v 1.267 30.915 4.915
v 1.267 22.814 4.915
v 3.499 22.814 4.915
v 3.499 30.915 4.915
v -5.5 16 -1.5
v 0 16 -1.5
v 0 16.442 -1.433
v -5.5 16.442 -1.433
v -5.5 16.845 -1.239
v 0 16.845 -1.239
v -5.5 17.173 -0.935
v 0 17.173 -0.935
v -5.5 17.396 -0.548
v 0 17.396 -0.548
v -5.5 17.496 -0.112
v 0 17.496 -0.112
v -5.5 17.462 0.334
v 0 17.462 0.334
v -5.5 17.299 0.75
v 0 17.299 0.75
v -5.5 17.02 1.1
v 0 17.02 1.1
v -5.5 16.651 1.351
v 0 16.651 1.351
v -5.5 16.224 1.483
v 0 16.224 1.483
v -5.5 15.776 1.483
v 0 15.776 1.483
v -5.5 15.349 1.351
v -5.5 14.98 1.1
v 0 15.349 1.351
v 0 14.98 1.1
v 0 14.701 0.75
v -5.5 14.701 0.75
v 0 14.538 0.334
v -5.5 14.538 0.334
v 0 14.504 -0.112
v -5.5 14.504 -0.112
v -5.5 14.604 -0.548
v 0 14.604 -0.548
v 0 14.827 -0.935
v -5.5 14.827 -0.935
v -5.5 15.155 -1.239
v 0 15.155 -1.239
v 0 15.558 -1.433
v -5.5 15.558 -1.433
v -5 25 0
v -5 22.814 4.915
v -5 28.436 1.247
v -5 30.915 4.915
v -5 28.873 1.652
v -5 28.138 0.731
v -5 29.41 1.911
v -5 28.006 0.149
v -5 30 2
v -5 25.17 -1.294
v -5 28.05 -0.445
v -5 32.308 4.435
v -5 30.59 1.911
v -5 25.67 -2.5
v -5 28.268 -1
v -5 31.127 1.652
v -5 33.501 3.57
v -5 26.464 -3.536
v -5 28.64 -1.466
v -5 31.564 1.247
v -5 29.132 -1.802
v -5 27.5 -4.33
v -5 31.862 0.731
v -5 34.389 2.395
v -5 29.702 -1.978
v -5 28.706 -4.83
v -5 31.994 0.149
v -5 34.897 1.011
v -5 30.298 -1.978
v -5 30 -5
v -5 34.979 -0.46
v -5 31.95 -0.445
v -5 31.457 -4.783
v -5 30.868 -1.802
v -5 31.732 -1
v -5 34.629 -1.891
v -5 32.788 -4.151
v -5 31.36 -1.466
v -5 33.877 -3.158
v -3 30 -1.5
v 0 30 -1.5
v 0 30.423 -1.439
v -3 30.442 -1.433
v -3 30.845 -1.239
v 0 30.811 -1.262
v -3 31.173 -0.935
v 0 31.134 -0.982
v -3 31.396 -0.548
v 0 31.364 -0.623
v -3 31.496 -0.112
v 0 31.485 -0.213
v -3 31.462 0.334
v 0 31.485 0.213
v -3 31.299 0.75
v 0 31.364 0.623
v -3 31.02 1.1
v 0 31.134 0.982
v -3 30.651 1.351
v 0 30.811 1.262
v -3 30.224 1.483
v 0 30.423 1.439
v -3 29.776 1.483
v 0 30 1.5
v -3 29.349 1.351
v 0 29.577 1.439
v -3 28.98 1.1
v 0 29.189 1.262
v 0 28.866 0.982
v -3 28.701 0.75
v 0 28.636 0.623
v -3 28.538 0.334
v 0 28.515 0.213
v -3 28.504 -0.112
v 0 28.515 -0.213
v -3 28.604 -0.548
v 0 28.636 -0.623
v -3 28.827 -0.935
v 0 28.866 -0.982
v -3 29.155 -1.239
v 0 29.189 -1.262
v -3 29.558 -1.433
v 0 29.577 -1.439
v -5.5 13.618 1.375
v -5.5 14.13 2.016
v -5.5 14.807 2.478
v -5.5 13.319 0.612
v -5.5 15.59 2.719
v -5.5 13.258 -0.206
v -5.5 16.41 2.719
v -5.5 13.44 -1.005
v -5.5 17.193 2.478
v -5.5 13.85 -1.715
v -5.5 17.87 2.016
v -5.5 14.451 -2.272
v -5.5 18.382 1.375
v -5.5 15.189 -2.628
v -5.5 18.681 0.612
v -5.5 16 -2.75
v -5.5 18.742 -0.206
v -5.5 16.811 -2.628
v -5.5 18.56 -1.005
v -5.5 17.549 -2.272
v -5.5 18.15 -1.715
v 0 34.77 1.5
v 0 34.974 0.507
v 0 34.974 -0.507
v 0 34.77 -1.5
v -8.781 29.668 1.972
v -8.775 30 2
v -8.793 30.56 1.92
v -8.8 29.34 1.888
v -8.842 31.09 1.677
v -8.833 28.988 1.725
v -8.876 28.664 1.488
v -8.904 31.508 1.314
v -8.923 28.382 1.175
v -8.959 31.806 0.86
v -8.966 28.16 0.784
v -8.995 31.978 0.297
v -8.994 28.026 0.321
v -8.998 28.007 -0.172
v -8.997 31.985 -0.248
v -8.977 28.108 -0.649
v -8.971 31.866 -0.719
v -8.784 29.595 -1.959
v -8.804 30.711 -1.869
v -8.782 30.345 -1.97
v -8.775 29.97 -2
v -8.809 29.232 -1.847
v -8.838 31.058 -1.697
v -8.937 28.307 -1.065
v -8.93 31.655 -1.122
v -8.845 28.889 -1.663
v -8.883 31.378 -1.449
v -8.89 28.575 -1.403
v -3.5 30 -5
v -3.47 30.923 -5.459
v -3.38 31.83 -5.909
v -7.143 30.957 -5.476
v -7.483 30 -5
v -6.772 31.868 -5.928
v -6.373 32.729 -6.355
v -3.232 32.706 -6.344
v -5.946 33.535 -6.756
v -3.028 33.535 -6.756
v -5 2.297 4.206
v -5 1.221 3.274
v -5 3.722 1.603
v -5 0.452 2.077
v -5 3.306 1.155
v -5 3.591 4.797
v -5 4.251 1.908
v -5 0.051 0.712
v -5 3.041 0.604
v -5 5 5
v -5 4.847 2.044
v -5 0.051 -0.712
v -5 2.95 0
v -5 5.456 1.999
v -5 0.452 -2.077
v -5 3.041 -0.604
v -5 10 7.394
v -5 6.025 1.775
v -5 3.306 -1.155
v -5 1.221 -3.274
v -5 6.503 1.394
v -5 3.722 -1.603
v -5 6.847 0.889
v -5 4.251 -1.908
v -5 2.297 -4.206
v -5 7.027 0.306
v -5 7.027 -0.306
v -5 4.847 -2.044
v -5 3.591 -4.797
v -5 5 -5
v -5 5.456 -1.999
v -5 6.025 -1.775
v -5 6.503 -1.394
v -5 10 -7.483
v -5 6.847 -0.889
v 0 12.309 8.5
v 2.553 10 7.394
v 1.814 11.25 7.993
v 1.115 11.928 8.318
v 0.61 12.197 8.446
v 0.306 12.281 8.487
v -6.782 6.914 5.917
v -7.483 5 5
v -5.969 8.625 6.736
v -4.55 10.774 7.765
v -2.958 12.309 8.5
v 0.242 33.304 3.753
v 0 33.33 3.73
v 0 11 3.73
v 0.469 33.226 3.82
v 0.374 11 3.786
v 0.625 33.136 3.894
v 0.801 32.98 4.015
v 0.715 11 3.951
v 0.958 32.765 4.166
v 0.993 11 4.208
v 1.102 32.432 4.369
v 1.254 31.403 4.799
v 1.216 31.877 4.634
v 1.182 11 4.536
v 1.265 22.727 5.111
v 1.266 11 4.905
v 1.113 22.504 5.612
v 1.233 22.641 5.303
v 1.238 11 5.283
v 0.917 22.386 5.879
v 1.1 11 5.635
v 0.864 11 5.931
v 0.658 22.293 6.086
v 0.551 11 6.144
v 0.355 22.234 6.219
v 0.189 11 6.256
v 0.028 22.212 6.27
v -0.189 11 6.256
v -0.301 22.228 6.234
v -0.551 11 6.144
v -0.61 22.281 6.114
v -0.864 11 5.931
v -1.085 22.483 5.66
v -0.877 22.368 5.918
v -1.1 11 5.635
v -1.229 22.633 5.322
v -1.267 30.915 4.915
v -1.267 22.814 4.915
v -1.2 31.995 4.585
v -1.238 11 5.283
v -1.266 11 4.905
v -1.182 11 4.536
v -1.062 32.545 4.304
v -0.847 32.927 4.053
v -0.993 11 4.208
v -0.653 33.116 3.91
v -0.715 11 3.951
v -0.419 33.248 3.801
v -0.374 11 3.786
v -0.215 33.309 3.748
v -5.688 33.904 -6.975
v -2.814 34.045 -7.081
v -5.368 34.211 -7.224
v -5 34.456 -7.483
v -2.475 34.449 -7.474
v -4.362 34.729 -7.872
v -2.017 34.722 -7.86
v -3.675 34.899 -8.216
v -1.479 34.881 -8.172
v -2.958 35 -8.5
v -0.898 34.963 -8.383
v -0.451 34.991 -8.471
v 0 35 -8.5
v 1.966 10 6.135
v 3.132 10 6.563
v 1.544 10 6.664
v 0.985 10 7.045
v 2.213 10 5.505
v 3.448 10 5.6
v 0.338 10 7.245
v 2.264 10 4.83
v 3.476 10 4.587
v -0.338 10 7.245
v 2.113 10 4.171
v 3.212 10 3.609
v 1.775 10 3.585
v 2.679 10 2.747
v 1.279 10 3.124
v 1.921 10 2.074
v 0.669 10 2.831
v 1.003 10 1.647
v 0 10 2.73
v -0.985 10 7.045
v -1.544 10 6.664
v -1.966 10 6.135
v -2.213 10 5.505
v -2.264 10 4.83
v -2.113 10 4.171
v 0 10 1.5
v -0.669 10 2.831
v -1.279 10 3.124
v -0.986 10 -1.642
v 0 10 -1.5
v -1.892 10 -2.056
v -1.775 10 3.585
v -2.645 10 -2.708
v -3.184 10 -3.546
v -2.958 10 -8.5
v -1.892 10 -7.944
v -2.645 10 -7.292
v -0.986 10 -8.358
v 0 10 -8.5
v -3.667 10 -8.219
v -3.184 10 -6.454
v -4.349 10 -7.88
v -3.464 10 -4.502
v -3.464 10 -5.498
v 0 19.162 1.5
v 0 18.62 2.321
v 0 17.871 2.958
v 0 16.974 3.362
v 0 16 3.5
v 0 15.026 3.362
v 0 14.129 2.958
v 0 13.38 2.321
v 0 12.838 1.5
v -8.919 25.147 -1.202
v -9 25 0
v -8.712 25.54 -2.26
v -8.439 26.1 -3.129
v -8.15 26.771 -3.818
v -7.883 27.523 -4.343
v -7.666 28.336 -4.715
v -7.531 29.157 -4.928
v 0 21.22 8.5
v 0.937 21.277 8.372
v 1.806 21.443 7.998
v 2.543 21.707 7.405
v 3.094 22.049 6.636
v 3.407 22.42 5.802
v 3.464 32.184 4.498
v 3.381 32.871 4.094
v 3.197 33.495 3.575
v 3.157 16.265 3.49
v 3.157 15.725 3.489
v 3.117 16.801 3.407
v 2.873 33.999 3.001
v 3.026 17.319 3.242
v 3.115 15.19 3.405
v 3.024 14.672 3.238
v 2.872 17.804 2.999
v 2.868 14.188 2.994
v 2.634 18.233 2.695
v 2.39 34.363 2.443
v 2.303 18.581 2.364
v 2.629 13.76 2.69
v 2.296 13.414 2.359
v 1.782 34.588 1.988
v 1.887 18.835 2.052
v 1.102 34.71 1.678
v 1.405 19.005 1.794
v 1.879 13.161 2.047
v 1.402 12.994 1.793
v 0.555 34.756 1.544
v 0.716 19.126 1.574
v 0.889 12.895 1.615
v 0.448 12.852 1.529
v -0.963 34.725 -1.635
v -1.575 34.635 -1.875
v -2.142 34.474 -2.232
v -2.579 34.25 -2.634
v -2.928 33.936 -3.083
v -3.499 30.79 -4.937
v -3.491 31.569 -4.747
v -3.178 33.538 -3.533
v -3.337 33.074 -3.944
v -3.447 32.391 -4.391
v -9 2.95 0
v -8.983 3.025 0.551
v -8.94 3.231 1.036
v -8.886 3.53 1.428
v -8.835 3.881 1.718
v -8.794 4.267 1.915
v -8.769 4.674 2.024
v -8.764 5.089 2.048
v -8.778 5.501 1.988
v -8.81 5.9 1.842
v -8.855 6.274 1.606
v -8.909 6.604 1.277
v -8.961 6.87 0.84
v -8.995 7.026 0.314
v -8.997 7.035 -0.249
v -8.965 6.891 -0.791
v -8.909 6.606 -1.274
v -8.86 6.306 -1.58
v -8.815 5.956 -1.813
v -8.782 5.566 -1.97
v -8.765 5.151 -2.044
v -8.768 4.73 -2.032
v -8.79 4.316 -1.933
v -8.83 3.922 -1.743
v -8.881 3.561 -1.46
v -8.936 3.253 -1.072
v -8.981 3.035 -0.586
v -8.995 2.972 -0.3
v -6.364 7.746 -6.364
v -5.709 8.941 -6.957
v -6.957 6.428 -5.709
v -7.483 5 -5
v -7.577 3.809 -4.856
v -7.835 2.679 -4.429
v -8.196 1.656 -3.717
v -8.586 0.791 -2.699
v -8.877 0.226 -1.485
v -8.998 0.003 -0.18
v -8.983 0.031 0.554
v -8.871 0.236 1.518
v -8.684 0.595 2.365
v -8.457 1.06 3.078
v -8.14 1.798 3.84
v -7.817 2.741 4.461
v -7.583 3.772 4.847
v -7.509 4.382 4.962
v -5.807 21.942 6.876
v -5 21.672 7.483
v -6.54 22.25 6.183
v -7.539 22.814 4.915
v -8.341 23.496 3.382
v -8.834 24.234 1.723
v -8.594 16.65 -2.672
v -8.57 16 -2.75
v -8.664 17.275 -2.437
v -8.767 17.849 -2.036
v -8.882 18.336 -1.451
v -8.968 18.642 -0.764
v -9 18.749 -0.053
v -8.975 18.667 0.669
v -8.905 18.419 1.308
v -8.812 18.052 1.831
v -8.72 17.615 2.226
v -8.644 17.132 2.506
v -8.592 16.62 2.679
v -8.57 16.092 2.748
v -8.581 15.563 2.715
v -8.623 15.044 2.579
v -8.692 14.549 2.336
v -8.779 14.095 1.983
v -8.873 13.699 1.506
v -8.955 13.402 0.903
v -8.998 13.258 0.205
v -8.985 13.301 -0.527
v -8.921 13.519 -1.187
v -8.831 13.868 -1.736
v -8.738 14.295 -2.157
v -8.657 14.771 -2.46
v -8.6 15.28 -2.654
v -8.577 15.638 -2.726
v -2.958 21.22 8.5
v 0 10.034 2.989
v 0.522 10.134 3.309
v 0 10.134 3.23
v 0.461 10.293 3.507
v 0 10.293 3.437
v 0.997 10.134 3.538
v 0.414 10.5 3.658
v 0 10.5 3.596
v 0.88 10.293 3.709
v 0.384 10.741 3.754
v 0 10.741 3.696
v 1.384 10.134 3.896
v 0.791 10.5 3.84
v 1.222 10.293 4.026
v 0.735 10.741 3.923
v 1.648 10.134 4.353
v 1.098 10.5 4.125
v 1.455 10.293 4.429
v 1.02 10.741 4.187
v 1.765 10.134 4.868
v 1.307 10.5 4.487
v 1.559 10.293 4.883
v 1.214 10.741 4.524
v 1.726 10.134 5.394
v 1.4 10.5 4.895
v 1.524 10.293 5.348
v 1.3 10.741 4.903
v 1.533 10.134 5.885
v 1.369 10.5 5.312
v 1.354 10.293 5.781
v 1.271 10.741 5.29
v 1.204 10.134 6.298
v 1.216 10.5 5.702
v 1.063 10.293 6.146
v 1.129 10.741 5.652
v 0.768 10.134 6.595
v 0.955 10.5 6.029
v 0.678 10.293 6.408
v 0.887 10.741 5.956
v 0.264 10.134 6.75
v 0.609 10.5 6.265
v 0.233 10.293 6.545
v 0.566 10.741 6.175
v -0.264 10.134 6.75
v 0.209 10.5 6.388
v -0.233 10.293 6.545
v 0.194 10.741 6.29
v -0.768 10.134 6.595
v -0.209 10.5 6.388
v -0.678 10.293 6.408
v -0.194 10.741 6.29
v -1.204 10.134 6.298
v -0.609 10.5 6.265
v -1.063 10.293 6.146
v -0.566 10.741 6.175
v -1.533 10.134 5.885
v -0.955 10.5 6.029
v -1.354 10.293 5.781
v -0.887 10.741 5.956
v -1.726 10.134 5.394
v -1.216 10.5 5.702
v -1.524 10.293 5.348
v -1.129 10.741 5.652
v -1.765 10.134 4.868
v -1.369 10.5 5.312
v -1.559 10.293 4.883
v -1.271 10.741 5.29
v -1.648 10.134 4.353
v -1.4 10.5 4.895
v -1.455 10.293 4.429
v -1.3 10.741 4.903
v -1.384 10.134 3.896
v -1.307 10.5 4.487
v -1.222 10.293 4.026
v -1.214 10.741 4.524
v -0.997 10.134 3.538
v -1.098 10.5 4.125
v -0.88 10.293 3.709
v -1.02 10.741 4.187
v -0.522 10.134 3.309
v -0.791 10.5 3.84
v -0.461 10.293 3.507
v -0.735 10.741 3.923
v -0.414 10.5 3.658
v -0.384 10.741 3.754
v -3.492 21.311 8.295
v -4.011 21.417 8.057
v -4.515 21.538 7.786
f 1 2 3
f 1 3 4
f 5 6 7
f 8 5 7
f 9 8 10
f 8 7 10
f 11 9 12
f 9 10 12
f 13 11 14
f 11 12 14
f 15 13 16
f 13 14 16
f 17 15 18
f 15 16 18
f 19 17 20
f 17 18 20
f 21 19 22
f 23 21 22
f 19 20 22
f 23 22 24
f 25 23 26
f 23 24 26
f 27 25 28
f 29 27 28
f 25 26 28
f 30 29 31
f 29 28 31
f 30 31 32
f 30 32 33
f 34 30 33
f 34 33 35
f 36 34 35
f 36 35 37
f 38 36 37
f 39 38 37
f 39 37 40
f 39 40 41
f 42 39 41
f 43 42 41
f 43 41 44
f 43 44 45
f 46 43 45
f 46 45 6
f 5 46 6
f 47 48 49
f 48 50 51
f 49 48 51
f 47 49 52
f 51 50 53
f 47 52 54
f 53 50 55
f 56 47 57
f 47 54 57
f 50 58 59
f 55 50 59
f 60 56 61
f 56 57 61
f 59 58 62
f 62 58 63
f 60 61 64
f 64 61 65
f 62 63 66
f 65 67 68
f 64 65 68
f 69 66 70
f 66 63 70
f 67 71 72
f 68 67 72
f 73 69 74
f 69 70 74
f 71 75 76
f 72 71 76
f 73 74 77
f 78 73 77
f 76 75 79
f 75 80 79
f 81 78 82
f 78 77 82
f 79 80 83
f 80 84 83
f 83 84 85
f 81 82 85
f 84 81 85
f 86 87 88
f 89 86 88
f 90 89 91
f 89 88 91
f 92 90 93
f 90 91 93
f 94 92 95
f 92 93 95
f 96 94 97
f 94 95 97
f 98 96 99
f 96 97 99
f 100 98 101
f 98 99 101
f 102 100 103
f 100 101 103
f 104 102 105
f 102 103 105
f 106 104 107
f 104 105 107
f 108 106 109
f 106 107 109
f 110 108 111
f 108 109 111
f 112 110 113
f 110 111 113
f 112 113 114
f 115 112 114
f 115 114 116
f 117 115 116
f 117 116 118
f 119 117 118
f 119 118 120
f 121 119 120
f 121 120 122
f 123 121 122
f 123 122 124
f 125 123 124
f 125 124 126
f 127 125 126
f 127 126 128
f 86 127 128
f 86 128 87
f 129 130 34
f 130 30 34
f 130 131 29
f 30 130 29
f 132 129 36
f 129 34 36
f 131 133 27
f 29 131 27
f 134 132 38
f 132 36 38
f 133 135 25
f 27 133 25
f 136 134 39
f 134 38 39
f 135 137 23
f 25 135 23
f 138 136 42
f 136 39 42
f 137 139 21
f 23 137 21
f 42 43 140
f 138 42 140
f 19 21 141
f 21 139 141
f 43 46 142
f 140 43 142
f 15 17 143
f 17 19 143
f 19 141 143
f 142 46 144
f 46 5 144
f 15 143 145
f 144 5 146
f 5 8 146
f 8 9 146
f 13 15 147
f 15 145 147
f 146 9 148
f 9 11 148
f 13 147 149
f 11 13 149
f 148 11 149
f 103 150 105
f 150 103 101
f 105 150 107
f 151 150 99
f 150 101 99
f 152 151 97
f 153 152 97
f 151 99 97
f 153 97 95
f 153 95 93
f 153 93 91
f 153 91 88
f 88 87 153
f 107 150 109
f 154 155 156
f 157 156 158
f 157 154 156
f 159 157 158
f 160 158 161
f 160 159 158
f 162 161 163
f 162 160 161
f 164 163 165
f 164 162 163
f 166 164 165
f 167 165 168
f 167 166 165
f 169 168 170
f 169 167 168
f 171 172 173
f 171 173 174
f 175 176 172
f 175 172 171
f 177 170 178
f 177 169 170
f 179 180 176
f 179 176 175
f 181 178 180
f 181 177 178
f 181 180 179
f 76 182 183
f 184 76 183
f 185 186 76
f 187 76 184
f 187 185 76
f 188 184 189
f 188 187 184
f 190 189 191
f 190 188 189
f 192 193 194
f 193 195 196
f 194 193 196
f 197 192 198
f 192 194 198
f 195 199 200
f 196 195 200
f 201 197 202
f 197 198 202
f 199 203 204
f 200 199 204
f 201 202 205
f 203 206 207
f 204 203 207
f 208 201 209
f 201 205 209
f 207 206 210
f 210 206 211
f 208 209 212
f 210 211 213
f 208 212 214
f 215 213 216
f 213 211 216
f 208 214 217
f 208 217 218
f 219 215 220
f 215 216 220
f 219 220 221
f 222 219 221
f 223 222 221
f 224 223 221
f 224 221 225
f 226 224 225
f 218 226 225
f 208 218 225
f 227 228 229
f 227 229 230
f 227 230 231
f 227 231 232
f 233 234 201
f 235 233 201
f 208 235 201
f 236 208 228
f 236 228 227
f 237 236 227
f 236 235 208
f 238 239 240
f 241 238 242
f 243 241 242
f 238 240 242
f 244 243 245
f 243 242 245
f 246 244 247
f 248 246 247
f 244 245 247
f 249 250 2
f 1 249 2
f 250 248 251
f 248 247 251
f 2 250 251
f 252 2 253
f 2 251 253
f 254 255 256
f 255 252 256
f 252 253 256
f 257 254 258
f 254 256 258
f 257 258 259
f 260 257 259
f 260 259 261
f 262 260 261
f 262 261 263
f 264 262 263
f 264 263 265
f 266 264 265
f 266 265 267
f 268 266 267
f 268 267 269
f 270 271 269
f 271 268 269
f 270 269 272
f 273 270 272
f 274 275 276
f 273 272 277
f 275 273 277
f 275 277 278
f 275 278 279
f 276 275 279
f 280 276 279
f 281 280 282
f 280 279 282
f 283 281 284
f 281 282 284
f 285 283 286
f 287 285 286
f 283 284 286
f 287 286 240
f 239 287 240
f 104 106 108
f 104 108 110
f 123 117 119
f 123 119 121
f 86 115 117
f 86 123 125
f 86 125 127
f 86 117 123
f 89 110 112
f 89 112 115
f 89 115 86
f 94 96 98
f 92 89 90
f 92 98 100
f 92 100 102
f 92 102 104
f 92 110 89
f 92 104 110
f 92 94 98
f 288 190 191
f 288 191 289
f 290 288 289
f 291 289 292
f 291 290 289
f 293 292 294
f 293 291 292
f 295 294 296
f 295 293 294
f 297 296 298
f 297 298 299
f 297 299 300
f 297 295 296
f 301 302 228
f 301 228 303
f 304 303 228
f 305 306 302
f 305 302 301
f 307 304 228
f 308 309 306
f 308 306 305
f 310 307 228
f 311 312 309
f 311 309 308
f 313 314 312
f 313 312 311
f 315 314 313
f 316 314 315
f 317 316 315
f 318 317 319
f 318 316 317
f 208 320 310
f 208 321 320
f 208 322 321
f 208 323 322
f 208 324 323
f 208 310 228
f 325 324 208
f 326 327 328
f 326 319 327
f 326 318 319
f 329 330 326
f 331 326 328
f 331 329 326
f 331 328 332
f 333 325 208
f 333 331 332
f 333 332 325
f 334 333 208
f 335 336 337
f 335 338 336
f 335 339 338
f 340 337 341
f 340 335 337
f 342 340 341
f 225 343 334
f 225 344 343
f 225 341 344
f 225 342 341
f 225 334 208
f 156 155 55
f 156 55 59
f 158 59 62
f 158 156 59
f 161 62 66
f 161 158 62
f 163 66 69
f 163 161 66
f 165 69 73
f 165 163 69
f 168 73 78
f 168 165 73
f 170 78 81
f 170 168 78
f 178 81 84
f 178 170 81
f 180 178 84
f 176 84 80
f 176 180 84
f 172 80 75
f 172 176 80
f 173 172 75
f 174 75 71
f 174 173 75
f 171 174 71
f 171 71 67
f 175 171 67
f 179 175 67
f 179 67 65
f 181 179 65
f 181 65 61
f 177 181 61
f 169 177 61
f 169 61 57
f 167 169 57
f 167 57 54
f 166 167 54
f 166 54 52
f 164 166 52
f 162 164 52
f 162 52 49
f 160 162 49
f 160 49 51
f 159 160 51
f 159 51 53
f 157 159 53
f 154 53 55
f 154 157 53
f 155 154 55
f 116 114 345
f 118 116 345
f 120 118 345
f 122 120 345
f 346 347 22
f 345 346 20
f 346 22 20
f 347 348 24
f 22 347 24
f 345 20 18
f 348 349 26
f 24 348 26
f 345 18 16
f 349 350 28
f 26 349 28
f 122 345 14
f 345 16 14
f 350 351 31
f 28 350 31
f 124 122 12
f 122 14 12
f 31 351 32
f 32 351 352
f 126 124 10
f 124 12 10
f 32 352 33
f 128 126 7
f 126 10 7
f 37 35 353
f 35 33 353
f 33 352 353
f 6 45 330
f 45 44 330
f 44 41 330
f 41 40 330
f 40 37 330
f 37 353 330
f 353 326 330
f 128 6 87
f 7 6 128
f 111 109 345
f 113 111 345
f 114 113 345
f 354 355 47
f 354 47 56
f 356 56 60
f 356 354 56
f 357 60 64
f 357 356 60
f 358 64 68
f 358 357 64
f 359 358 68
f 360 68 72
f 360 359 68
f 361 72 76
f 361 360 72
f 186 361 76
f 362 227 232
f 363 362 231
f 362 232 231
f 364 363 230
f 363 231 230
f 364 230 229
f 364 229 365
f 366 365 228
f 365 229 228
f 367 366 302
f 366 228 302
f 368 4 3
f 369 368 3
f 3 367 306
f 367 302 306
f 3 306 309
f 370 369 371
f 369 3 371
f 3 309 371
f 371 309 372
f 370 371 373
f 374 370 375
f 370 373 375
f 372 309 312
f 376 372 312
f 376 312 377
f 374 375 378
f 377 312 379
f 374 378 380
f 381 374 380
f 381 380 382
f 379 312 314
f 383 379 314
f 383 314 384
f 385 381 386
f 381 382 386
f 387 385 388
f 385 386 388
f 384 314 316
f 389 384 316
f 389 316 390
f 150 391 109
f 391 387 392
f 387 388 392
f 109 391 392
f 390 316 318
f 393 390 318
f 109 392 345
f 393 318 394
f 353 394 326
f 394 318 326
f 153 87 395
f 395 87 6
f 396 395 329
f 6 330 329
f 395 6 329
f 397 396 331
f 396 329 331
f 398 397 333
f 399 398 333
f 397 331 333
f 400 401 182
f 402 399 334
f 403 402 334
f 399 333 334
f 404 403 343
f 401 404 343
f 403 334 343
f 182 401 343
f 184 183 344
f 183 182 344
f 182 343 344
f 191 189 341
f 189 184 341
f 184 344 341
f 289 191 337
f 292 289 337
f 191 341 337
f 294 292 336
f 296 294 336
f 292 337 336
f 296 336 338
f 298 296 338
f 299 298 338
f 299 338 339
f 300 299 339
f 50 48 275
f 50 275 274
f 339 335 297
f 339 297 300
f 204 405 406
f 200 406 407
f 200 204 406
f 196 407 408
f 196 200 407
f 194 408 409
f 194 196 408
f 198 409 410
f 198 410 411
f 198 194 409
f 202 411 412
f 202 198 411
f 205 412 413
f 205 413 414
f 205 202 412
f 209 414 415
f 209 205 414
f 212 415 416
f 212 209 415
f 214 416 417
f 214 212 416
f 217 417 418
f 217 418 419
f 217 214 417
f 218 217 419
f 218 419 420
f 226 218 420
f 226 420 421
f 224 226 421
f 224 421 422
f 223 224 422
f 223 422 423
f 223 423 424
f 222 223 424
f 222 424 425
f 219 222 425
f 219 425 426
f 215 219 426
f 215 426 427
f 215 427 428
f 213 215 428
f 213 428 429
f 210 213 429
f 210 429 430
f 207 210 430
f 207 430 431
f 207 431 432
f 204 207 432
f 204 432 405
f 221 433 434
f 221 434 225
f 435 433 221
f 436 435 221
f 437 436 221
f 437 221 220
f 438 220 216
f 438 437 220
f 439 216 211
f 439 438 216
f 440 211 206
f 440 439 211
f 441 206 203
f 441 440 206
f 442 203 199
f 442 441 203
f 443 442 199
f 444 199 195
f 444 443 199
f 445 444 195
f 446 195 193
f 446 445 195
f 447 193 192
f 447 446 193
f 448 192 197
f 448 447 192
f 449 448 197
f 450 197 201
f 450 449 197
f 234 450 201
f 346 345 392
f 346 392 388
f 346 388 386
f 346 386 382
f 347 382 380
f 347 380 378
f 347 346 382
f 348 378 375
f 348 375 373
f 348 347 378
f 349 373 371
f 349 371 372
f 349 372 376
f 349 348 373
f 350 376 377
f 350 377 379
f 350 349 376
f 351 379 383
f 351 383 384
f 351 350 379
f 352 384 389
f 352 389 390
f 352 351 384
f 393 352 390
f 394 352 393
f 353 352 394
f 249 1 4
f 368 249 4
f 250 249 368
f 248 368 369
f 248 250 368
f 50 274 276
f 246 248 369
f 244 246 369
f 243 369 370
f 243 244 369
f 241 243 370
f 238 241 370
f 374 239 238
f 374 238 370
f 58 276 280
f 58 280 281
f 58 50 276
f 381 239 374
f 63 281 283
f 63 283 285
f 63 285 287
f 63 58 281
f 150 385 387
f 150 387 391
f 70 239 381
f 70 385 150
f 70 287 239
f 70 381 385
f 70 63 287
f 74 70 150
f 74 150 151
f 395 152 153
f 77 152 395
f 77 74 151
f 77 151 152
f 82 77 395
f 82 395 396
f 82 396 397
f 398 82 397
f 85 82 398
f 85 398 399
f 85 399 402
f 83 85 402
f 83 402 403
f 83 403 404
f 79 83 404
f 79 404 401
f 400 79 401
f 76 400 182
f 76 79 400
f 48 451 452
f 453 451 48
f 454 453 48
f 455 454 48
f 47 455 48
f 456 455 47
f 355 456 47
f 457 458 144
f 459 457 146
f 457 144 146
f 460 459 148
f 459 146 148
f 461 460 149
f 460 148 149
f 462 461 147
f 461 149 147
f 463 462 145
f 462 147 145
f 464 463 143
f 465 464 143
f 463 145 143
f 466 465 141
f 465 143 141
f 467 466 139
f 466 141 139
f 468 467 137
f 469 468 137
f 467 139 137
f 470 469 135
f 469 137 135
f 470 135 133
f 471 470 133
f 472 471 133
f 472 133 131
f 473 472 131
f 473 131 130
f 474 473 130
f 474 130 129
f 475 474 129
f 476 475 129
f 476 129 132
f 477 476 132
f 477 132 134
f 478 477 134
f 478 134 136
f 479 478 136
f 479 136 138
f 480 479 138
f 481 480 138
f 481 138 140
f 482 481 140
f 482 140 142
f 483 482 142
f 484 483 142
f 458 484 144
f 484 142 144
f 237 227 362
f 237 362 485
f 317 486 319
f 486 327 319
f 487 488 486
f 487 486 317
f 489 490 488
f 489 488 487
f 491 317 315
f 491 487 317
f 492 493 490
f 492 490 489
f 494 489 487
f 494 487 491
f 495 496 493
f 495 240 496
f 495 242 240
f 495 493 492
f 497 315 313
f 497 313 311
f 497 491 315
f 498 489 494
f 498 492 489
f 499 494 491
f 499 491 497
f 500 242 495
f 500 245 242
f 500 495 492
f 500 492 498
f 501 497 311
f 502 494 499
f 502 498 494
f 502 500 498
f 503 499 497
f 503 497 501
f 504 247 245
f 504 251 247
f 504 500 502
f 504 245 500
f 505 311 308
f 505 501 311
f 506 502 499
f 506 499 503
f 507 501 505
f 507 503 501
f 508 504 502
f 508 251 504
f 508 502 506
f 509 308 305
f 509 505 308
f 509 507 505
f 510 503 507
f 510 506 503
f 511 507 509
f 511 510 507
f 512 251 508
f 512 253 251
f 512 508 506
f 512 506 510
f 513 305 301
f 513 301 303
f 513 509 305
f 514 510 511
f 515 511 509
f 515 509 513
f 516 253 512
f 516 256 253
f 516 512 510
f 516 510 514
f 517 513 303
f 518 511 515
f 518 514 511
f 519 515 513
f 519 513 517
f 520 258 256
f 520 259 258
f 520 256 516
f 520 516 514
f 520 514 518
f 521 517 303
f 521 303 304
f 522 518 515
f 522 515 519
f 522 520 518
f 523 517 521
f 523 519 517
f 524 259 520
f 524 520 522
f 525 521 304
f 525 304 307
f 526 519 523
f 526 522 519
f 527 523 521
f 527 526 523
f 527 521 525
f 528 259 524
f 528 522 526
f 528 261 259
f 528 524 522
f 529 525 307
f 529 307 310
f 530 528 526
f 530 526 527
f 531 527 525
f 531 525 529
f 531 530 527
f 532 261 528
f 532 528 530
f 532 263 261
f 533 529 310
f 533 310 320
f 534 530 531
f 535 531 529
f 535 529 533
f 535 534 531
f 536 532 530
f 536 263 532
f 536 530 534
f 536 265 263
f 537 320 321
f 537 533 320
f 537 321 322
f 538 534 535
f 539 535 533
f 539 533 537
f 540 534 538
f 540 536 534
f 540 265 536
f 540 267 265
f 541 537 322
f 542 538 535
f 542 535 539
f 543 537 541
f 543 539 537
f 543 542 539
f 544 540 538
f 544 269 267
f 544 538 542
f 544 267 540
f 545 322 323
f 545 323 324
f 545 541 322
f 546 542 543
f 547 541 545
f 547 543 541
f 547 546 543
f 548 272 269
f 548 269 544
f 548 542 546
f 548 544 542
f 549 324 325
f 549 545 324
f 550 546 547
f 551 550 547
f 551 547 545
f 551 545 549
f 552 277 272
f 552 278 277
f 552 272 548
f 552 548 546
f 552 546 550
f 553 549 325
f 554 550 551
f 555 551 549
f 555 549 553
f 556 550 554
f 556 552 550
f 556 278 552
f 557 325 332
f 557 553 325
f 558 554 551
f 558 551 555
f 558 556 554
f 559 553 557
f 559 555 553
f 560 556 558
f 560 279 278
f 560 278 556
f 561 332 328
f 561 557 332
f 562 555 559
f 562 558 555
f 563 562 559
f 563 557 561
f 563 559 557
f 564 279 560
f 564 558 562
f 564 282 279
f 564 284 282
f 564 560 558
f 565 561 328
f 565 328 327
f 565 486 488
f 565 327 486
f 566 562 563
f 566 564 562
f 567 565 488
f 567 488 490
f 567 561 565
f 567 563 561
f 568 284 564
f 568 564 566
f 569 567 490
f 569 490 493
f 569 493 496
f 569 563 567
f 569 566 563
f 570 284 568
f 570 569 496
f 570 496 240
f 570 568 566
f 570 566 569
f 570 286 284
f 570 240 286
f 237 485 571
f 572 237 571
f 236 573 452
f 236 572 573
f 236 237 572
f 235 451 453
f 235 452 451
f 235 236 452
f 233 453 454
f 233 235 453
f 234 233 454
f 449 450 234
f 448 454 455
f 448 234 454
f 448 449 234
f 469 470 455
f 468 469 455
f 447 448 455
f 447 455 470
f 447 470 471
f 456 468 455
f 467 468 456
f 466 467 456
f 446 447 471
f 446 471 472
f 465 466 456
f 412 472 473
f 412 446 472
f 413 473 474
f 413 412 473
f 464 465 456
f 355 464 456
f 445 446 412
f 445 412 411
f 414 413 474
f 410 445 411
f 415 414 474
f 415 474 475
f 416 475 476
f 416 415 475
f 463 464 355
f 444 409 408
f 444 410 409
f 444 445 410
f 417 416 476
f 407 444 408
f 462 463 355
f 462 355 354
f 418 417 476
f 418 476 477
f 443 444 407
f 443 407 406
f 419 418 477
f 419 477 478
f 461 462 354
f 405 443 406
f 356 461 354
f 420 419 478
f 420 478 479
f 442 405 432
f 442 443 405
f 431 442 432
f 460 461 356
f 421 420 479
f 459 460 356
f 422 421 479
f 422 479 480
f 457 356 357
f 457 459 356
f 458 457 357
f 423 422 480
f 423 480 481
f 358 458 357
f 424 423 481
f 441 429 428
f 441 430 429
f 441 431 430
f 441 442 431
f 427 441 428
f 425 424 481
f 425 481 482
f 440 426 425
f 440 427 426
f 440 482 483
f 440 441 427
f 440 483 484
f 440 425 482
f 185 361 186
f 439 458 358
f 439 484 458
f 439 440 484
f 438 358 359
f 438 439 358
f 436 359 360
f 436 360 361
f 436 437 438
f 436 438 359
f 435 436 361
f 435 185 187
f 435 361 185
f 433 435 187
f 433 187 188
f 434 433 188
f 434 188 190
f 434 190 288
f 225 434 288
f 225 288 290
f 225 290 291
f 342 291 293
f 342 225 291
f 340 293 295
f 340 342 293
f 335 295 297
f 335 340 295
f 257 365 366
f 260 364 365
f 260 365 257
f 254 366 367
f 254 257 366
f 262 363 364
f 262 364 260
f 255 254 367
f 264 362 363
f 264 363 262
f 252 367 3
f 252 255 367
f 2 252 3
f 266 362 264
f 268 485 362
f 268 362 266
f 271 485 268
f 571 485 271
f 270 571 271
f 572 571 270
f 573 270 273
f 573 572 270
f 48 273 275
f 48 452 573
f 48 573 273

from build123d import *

# Parameters (mm, degrees)
BOSS_EXTRUDE1_DEPTH = 35
SKETCH2_R           = 1.27
CUT_EXTRUDE1_DEPTH  = 35
CUT_EXTRUDE2_REACH  = 41.937
SKETCH3_W           = 10
SKETCH3_H           = 10
SKETCH4_R           = 2.049999964
CUT_EXTRUDE3_DEPTH  = 17.5
CUT_EXTRUDE5_START  = -7.95804
SKETCH6_R           = 2
CUT_EXTRUDE5_DEPTH  = 9.6
FILLET3_R           = 1
CUT_EXTRUDE6_START  = 8.64596
SKETCH6_3_R         = 2
CUT_EXTRUDE6_DEPTH  = 6.604
CUT_EXTRUDE7_START  = -14.986
CUT_EXTRUDE7_DEPTH  = 14.986
CUT_EXTRUDE8_DEPTH  = 31.496
SKETCH9_R           = 1.5
CUT_EXTRUDE9_DEPTH  = 14.224
CUT_EXTRUDE11_DEPTH = 6.048
SKETCH13_R          = 1.5
CUT_EXTRUDE12_DEPTH = 3
CUT_EXTRUDE13_START = -5.5
SKETCH15_R          = 2.75
CUT_EXTRUDE13_DEPTH = 7.572


with BuildPart() as part:
    # Sketch1 → Boss-Extrude1 (new body)
    with BuildSketch(Plane(origin=(0, 0, 0), x_dir=(1, 0, 0), z_dir=(0, 1, 0))):
        with BuildLine():
            Line((-2.958039892, 8.5), (2.958039892, 8.5))
            ThreePointArc((2.958039892, 8.5), (9, 0), (2.958039892, -8.5))
            Line((2.958039892, -8.5), (-2.958039892, -8.5))
            ThreePointArc((-2.958039892, -8.5), (-9, 0), (-2.958039892, 8.5))
        make_face()
    extrude(amount=BOSS_EXTRUDE1_DEPTH)

    # Sketch2 → Cut-Extrude1 (cut)
    with BuildSketch(Plane.XZ):
        with Locations(Location((0, -5, 0), (0, 0, 270))):
            Circle(SKETCH2_R)
        with Locations(Location((0, 5, 0), (0, 0, 270))):
            Circle(SKETCH2_R)
    extrude(amount=-CUT_EXTRUDE1_DEPTH, mode=Mode.SUBTRACT)

    # Cut-Extrude2: up to this face of the body (flat: up to its plane)
    cut_extrude2_end = Plane(part.part.faces().sort_by_distance((0, 17.5, 8.5))[0])
    # Sketch3 → Cut-Extrude2 (cut, up to the picked face)
    with BuildSketch(Plane(origin=(0, 0, -8.5), x_dir=(-1, 0, 0), z_dir=(0, 0, -1)), mode=Mode.PRIVATE) as cut_extrude2_sk1:
        with Locations((0, 5)):
            Rectangle(SKETCH3_W, SKETCH3_H)
    cut_extrude2_tool1 = split(extrude(cut_extrude2_sk1.sketch, amount=-CUT_EXTRUDE2_REACH, mode=Mode.PRIVATE), bisect_by=cut_extrude2_end, keep=Keep.BOTH, mode=Mode.PRIVATE)
    add(cut_extrude2_tool1.solids().sort_by(Axis((0, 5, -8.5), (0, 0, 1)))[0], mode=Mode.SUBTRACT)

    # Sketch4 → Cut-Extrude3 (cut, symmetric)
    with BuildSketch(Plane.ZY.offset(-5)):
        with Locations(Location((0, 5, 0), (0, 0, 270))):
            Circle(SKETCH4_R)
        with BuildLine():
            Line((-7.483314774, 10), (-5, 5))
            ThreePointArc((-5, 5), (0, 0), (5, 5))
            Line((5, 5), (8.5, 12.308552788))
            Line((8.5, 12.308552788), (9.857943437, -1.822240199))
            Line((9.857943437, -1.822240199), (-9.857943437, -1.822240199))
            Line((-9.857943437, -1.822240199), (-7.483314774, 10))
        make_face()
    extrude(amount=CUT_EXTRUDE3_DEPTH, both=True, mode=Mode.SUBTRACT)

    # Sketch6 → Cut-Extrude5 (cut)
    with BuildSketch(Plane.ZY.offset(2.958039892).offset(CUT_EXTRUDE5_START)):
        with BuildLine():
            Line((8.5, 21.219917379), (0, 25))
            ThreePointArc((0, 25), (-3.535533906, 26.464466094), (-5, 30))
            Line((-5, 30), (-6.755867779, 33.535330675))
            ThreePointArc((-6.755867779, 33.535330675), (-7.475170692, 34.449576169), (-8.5, 35))
            Line((-8.5, 35), (17.803004008, 42.886049022))
            Line((17.803004008, 42.886049022), (8.5, 21.219917379))
        make_face()
        with Locations((0, 30)):
            Circle(SKETCH6_R, mode=Mode.SUBTRACT)
    extrude(amount=-CUT_EXTRUDE5_DEPTH, mode=Mode.SUBTRACT)

    # Fillet3
    fillet3_edges = [part.edges().sort_by_distance(p)[0] for p in [
        (0, 10, -3.73),
        (0, 10, 6.27),
    ]]
    fillet(fillet3_edges, radius=FILLET3_R)

    # Sketch6<3> → Cut-Extrude6 (cut)
    with BuildSketch(Plane.ZY.offset(2.958039892).offset(CUT_EXTRUDE6_START)):
        with BuildLine():
            Line((8.5, 21.219917379), (0, 25))
            ThreePointArc((0, 25), (-3.535533906, 26.464466094), (-5, 30))
            Line((-5, 30), (-6.755867779, 33.535330675))
            ThreePointArc((-6.755867779, 33.535330675), (-7.475170692, 34.449576169), (-8.5, 35))
            Line((-8.5, 35), (17.803004008, 42.886049022))
            Line((17.803004008, 42.886049022), (8.5, 21.219917379))
        make_face()
        with Locations((0, 30)):
            Circle(SKETCH6_3_R, mode=Mode.SUBTRACT)
    extrude(amount=-CUT_EXTRUDE6_DEPTH, mode=Mode.SUBTRACT)

    # Sketch7 → Cut-Extrude7 (cut)
    with BuildSketch(Plane(origin=(5, 0, 0), x_dir=(0, 0, -1), z_dir=(1, 0, 0)).offset(CUT_EXTRUDE7_START)):
        with BuildLine():
            Line((5, 30), (6.755867779, 33.535330675))
            ThreePointArc((6.755867779, 33.535330675), (7.475170692, 34.449576169), (8.5, 35))
            Line((8.5, 35), (-8.341946035, 47.536710192))
            Line((-8.341946035, 47.536710192), (-13.168237897, 33.528506419))
            Line((-13.168237897, 33.528506419), (-10.04678731, 20.532036929))
            Line((-10.04678731, 20.532036929), (-4.915473018, 22.814012455))
            Line((-4.915473018, 22.814012455), (-4.915473018, 30.915491676))
            ThreePointArc((-4.915473018, 30.915491676), (0.459692783, 34.97882341), (5, 30))
        make_face()
    extrude(amount=CUT_EXTRUDE7_DEPTH, mode=Mode.SUBTRACT)

    # Sketch8 → Cut-Extrude8 (cut, symmetric)
    with BuildSketch(Plane.XZ.offset(-10)):
        with BuildLine():
            Line((0, 1.5), (0, -1.5))
            ThreePointArc((0, -1.5), (-3.5, -5), (0, -8.5))
            Line((0, -8.5), (-4.790142834, -16.013604782))
            Line((-4.790142834, -16.013604782), (34.96476625, -1.5))
            Line((34.96476625, -1.5), (-4.790142834, 15.219000931))
            Line((-4.790142834, 15.219000931), (0, 8.5))
            ThreePointArc((0, 8.5), (3.5, 5), (0, 1.5))
        make_face()
    extrude(amount=CUT_EXTRUDE8_DEPTH, both=True, mode=Mode.SUBTRACT)

    # Sketch9 → Cut-Extrude9 (cut)
    with BuildSketch(Plane(origin=(0, 0, 0), x_dir=(0, 0, -1), z_dir=(1, 0, 0))):
        with Locations((0, 16)):
            Circle(SKETCH9_R)
    extrude(amount=-CUT_EXTRUDE9_DEPTH, mode=Mode.SUBTRACT)

    # Sketch14 → Cut-Extrude11 (cut)
    with BuildSketch(Plane(origin=(0, 0, 0), x_dir=(0, 0, -1), z_dir=(1, 0, 0))):
        with BuildLine():
            Line((0, 12.5), (0, 19.5))
            ThreePointArc((0, 19.5), (-3.5, 16), (0, 12.5))
        make_face()
    extrude(amount=CUT_EXTRUDE11_DEPTH, mode=Mode.SUBTRACT)

    # Sketch13 → Cut-Extrude12 (cut)
    with BuildSketch(Plane(origin=(0, 0, 0), x_dir=(0, 0, -1), z_dir=(1, 0, 0))):
        with Locations((0, 30)):
            Circle(SKETCH13_R)
    extrude(amount=-CUT_EXTRUDE12_DEPTH, mode=Mode.SUBTRACT)

    # Sketch15 → Cut-Extrude13 (cut)
    with BuildSketch(Plane(origin=(0, 0, 0), x_dir=(0, 0, -1), z_dir=(1, 0, 0)).offset(CUT_EXTRUDE13_START)):
        with Locations((0, 16)):
            Circle(SKETCH15_R)
    extrude(amount=-CUT_EXTRUDE13_DEPTH, mode=Mode.SUBTRACT)


solid = part.part
